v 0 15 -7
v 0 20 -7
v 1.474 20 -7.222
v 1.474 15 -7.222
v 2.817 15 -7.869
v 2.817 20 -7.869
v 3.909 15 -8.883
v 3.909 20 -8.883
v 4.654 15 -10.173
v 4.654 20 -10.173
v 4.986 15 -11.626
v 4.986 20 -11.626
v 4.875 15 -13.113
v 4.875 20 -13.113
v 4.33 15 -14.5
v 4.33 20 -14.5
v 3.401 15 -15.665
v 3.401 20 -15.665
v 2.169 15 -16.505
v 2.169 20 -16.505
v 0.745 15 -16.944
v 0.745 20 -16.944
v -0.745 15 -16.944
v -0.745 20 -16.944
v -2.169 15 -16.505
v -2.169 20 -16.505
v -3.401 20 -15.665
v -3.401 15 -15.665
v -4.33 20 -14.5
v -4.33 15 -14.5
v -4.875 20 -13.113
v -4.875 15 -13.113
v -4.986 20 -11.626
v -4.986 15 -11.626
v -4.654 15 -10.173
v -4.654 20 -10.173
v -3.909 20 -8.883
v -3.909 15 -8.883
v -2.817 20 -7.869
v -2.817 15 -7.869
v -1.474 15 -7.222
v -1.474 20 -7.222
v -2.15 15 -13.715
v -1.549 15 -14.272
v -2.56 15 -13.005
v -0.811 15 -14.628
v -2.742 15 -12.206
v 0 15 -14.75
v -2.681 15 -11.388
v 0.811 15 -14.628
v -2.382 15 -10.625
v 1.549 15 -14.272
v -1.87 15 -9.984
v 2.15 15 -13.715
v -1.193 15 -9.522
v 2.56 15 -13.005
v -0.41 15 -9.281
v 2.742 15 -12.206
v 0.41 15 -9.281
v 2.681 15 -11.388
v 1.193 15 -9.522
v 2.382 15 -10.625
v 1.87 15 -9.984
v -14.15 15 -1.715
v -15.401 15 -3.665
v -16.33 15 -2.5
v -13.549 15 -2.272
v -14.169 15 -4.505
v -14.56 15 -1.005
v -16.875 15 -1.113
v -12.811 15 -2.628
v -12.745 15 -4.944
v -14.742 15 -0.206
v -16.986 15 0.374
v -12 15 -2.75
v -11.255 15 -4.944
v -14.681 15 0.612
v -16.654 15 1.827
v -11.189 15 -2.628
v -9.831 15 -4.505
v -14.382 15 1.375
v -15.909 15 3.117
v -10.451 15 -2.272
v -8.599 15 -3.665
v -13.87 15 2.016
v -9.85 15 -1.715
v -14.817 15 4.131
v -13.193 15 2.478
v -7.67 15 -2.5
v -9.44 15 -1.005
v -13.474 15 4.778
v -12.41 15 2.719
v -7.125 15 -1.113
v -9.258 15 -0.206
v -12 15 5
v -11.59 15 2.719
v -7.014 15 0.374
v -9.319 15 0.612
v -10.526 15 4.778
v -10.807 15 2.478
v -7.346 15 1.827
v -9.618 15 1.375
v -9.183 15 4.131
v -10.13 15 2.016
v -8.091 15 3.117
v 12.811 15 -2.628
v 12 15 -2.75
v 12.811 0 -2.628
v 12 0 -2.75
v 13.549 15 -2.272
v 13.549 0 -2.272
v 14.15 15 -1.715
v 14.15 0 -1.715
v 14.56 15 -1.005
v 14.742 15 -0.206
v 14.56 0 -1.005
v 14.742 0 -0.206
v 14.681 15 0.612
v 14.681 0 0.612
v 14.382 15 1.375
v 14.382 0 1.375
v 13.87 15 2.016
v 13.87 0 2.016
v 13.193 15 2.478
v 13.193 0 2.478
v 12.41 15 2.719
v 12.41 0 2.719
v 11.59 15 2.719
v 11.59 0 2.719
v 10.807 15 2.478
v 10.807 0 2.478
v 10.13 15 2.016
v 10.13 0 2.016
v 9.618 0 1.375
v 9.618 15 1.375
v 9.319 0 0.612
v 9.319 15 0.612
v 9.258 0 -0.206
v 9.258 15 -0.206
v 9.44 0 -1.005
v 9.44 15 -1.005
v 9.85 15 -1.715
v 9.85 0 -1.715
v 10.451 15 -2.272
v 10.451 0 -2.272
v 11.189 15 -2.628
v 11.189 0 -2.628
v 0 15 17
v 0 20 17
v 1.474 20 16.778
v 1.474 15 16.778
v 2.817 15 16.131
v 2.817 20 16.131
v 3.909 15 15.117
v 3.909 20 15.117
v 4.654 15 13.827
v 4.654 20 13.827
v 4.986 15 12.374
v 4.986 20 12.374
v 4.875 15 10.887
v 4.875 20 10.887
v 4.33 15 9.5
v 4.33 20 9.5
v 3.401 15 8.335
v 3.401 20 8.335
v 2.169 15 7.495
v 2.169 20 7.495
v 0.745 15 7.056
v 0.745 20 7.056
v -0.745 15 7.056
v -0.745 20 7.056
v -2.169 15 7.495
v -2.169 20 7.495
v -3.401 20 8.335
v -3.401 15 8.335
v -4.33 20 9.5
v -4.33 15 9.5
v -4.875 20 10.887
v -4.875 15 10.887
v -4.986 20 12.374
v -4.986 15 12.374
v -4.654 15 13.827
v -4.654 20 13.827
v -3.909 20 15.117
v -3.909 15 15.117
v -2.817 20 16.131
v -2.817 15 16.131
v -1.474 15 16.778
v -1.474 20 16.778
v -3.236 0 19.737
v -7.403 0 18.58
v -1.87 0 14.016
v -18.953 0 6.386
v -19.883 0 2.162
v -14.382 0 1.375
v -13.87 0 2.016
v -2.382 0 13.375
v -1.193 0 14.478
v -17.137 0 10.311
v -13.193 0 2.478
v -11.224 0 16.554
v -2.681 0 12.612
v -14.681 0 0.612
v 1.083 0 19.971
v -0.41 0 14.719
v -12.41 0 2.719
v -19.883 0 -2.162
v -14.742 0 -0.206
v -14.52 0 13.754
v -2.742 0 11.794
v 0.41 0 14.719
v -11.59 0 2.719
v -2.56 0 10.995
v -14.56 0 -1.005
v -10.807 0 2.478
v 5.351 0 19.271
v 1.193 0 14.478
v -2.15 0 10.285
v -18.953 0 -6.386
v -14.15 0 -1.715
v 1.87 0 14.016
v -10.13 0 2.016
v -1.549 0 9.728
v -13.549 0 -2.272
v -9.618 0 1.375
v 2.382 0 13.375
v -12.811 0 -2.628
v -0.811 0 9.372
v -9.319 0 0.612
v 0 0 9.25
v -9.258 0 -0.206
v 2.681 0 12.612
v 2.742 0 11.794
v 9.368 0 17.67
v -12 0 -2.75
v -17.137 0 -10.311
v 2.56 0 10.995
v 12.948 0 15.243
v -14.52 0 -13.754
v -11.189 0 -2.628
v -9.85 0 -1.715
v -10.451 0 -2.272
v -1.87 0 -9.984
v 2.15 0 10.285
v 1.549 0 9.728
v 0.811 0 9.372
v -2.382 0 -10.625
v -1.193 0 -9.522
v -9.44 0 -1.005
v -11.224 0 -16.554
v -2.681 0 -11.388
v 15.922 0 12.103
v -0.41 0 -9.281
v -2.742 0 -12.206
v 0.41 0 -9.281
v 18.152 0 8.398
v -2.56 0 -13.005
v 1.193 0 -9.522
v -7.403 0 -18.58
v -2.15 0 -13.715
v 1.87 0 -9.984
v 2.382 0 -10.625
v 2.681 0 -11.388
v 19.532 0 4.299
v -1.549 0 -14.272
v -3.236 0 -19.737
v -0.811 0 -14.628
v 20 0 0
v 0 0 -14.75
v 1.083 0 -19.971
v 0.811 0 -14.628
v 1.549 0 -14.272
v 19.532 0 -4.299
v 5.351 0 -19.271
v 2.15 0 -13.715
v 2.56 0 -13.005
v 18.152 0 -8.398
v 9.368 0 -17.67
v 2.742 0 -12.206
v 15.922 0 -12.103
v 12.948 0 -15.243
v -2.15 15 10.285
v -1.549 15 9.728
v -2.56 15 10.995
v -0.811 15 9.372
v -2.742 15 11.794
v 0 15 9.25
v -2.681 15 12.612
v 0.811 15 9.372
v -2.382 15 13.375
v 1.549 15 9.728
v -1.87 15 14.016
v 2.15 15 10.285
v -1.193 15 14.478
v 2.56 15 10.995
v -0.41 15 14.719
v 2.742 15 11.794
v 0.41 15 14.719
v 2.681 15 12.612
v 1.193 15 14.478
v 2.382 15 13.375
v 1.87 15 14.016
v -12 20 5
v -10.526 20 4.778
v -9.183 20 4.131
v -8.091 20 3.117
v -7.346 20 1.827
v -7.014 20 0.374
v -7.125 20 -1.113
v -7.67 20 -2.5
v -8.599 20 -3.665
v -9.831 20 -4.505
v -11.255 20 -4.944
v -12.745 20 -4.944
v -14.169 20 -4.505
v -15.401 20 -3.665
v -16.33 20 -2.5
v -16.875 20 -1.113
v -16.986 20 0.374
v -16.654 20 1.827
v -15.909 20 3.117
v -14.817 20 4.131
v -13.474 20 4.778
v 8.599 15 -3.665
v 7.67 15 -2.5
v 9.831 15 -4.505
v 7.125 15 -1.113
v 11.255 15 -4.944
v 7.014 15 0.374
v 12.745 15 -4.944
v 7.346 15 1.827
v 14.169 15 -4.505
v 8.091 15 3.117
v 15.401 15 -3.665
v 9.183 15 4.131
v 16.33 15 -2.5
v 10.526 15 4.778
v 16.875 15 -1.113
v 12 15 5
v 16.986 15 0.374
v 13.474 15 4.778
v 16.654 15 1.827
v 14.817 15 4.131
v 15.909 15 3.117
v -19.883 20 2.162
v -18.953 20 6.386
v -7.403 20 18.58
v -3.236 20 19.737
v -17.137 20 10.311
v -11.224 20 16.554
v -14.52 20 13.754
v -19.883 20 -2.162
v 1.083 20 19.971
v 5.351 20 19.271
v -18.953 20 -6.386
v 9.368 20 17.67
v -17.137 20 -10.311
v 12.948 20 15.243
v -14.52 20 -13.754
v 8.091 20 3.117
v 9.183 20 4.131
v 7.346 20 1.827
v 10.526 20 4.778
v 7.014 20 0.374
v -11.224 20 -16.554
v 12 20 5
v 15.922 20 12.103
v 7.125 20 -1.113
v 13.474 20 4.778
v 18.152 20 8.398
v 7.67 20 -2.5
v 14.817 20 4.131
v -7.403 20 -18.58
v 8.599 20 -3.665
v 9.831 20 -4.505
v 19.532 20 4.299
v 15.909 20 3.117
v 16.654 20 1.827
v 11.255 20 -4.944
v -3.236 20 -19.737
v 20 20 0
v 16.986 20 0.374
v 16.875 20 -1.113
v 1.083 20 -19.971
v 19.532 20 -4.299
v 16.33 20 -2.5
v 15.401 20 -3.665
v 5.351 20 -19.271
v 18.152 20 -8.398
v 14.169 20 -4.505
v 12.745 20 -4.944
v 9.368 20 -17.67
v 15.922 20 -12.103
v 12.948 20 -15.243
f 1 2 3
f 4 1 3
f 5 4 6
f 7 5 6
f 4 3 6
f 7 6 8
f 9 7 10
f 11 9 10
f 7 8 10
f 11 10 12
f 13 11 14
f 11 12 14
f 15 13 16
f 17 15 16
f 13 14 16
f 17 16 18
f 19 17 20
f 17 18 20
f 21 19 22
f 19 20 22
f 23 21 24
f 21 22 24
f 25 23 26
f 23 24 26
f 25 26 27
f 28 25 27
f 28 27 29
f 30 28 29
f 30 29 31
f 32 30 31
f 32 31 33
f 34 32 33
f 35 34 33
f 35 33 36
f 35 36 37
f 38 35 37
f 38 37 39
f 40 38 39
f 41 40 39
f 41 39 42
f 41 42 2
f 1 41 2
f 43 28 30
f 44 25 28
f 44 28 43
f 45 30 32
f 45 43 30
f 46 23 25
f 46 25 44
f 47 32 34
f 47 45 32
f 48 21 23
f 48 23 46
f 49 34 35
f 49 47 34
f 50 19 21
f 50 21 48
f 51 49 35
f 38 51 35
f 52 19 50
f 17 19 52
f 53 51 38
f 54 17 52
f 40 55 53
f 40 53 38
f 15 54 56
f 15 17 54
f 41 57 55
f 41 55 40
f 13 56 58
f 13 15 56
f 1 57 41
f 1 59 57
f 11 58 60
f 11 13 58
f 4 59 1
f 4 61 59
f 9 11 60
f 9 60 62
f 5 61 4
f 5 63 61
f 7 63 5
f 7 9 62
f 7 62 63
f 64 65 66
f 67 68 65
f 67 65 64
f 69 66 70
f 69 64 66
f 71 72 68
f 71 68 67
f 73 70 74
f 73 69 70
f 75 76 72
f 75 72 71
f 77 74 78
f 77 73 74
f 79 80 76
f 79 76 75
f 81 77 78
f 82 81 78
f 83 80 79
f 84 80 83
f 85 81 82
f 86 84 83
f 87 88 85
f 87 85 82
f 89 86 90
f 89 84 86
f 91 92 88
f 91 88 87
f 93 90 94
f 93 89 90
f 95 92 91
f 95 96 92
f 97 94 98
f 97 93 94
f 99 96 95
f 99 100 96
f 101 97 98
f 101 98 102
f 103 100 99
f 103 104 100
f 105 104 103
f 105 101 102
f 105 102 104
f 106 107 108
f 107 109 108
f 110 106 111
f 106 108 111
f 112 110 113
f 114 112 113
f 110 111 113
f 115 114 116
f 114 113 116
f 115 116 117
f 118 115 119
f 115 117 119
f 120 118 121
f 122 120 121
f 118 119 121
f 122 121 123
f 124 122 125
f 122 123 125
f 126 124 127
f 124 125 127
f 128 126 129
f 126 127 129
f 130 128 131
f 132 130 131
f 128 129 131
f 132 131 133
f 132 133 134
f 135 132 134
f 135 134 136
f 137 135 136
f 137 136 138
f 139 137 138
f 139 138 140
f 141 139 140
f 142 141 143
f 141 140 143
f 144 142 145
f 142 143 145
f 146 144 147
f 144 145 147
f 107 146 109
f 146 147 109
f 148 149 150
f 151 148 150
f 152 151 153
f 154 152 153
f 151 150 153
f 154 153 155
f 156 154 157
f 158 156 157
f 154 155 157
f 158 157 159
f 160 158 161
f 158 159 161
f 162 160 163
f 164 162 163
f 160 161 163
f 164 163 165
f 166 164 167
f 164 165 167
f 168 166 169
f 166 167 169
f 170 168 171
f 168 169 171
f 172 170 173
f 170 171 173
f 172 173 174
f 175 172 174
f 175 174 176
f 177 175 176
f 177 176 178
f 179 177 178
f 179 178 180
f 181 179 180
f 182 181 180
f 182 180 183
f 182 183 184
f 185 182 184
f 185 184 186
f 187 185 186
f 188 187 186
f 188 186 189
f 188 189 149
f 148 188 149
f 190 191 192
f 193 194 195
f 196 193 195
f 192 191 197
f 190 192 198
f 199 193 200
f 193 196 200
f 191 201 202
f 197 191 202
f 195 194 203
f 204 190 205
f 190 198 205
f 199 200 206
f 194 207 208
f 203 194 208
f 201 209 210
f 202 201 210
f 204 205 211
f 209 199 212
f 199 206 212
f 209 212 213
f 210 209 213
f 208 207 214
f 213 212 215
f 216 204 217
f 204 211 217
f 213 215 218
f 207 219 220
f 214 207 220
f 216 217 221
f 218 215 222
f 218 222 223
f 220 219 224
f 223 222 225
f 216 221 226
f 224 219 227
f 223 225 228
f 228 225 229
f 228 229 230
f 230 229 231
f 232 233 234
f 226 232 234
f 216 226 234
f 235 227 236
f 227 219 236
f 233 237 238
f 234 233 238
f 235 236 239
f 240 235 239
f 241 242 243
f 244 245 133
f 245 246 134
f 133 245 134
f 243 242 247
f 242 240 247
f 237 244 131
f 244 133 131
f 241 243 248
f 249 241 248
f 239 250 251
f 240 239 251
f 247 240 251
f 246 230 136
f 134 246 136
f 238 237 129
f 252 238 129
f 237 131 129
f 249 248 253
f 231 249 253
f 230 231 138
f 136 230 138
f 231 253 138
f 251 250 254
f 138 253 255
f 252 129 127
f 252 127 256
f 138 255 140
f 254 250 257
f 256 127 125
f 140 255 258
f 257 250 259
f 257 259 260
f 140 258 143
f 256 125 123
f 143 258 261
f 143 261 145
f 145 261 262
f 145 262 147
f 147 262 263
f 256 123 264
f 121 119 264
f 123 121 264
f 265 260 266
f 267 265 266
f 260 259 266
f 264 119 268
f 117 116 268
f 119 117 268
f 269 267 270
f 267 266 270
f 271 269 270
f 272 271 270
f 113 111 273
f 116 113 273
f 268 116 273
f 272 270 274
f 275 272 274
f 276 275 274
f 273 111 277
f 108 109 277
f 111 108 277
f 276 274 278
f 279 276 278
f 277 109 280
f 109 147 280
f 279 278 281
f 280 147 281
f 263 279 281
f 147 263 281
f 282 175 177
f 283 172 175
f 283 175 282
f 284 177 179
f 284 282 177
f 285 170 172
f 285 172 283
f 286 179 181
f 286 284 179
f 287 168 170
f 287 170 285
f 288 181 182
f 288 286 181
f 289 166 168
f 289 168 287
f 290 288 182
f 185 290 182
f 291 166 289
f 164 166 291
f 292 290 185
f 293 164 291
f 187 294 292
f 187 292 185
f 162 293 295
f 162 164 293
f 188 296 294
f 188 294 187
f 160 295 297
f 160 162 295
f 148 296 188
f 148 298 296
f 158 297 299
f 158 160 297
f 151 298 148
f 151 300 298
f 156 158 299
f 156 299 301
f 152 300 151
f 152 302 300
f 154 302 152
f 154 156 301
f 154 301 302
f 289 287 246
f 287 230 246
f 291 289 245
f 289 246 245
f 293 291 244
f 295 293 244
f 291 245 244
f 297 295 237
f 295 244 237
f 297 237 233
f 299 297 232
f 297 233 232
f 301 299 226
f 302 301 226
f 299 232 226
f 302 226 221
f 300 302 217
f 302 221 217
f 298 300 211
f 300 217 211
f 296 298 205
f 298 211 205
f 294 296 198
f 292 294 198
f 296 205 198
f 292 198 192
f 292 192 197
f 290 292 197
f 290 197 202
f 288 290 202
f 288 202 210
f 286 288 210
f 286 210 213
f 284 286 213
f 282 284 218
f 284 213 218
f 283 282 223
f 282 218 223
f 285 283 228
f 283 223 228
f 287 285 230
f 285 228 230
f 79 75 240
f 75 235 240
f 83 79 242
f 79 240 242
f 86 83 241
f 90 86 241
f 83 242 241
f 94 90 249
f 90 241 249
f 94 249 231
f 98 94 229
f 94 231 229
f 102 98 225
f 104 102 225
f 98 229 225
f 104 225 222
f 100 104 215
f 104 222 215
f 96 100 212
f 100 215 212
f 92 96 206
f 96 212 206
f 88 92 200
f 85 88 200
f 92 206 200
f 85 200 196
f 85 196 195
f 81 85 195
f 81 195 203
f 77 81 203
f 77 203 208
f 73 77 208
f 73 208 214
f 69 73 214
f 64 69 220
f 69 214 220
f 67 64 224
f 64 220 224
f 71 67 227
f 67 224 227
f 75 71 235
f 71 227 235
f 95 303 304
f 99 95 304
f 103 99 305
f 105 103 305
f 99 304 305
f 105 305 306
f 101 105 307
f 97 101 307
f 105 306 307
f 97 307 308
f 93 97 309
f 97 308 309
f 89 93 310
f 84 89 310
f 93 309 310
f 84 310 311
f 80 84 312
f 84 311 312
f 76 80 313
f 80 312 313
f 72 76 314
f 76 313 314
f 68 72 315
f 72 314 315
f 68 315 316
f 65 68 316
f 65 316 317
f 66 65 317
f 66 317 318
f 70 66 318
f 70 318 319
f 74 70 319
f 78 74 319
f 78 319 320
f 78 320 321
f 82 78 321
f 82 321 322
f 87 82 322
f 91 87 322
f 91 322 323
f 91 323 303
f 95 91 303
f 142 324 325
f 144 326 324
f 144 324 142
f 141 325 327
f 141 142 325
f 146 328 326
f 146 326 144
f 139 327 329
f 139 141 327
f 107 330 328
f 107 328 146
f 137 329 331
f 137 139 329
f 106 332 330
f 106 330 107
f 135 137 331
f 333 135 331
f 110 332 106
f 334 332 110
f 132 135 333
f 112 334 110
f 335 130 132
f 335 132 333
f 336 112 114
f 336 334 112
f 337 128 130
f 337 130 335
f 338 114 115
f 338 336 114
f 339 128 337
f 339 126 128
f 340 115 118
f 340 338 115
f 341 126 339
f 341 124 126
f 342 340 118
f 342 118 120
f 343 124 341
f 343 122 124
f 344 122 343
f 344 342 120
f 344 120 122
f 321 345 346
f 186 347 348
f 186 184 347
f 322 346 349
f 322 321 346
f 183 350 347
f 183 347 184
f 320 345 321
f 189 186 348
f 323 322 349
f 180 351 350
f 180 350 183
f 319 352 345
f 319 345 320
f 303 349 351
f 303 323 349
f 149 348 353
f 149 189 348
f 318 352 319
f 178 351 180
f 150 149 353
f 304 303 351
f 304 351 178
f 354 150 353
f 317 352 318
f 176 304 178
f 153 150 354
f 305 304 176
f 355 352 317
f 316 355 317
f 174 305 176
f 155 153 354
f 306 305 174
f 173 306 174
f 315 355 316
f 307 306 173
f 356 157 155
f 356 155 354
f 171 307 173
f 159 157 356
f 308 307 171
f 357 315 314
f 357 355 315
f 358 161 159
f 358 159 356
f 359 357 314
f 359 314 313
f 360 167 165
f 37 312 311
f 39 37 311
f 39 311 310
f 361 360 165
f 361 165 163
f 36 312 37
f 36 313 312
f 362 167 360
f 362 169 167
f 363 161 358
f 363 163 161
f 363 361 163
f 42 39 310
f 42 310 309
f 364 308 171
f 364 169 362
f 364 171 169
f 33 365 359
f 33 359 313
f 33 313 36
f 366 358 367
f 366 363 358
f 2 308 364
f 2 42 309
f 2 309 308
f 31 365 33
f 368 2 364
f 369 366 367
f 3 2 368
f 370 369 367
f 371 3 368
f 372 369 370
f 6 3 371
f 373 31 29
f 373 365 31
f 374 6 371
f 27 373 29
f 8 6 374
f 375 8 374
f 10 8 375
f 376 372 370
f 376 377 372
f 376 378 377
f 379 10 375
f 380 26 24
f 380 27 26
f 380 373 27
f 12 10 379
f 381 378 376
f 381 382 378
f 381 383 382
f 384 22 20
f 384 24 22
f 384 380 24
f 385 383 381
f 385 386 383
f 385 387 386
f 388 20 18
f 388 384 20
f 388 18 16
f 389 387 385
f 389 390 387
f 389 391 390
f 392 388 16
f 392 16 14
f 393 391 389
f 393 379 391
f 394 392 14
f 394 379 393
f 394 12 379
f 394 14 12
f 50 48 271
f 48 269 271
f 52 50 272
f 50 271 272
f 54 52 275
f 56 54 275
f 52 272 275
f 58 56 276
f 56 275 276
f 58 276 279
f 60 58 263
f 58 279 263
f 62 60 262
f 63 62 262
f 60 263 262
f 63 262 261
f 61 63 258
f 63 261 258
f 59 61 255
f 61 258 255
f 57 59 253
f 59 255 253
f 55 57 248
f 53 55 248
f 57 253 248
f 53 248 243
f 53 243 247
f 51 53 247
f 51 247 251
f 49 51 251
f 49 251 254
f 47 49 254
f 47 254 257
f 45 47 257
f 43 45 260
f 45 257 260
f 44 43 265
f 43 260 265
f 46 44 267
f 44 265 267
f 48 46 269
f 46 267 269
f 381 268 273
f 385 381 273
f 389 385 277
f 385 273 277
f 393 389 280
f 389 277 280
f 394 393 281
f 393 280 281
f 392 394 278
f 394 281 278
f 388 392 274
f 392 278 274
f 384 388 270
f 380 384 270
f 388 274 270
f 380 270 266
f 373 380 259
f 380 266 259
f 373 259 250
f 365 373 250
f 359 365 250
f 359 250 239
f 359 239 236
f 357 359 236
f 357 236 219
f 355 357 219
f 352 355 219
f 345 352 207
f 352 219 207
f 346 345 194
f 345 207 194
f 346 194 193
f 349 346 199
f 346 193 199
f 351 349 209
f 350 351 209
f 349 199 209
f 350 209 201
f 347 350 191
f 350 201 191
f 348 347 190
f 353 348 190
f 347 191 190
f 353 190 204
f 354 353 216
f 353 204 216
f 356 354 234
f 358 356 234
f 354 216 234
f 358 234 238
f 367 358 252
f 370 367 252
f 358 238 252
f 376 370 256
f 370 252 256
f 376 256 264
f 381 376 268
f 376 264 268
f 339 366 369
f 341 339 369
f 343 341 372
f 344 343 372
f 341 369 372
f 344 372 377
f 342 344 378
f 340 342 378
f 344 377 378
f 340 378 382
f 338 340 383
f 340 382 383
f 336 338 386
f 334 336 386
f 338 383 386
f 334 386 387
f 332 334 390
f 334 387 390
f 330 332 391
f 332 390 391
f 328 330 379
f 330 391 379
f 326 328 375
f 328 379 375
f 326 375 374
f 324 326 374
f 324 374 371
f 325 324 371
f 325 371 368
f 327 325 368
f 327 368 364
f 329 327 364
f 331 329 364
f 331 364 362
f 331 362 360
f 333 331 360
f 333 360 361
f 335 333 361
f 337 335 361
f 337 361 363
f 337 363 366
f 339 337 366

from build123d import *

# Parameters (mm, degrees)
SKETCH1_R                               = 20
BOSS_EXTRUDE1_DEPTH                     = 20
CBORE_FOR_M5_HEX_HEAD_BOLT5_D           = 5.5
CBORE_FOR_M5_HEX_HEAD_BOLT5_CBORE_D     = 10
CBORE_FOR_M5_HEX_HEAD_BOLT5_CBORE_DEPTH = 5


with BuildPart() as part:
    # Sketch1 → Boss-Extrude1 (new body)
    with BuildSketch(Plane(origin=(0, 0, 0), x_dir=(1, 0, 0), z_dir=(0, 1, 0))):
        Circle(SKETCH1_R)
    extrude(amount=BOSS_EXTRUDE1_DEPTH)

    # CBORE for M5 Hex Head Bolt5 (through all)
    with Locations(Plane(origin=(0, 20, -12), x_dir=(0, 0, 1), z_dir=(0, 1, 0))):
        with Locations((0, 0), (12, 12), (24, 0), (12, -12)):
            CounterBoreHole(CBORE_FOR_M5_HEX_HEAD_BOLT5_D / 2, CBORE_FOR_M5_HEX_HEAD_BOLT5_CBORE_D / 2, CBORE_FOR_M5_HEX_HEAD_BOLT5_CBORE_DEPTH)


solid = part.part
